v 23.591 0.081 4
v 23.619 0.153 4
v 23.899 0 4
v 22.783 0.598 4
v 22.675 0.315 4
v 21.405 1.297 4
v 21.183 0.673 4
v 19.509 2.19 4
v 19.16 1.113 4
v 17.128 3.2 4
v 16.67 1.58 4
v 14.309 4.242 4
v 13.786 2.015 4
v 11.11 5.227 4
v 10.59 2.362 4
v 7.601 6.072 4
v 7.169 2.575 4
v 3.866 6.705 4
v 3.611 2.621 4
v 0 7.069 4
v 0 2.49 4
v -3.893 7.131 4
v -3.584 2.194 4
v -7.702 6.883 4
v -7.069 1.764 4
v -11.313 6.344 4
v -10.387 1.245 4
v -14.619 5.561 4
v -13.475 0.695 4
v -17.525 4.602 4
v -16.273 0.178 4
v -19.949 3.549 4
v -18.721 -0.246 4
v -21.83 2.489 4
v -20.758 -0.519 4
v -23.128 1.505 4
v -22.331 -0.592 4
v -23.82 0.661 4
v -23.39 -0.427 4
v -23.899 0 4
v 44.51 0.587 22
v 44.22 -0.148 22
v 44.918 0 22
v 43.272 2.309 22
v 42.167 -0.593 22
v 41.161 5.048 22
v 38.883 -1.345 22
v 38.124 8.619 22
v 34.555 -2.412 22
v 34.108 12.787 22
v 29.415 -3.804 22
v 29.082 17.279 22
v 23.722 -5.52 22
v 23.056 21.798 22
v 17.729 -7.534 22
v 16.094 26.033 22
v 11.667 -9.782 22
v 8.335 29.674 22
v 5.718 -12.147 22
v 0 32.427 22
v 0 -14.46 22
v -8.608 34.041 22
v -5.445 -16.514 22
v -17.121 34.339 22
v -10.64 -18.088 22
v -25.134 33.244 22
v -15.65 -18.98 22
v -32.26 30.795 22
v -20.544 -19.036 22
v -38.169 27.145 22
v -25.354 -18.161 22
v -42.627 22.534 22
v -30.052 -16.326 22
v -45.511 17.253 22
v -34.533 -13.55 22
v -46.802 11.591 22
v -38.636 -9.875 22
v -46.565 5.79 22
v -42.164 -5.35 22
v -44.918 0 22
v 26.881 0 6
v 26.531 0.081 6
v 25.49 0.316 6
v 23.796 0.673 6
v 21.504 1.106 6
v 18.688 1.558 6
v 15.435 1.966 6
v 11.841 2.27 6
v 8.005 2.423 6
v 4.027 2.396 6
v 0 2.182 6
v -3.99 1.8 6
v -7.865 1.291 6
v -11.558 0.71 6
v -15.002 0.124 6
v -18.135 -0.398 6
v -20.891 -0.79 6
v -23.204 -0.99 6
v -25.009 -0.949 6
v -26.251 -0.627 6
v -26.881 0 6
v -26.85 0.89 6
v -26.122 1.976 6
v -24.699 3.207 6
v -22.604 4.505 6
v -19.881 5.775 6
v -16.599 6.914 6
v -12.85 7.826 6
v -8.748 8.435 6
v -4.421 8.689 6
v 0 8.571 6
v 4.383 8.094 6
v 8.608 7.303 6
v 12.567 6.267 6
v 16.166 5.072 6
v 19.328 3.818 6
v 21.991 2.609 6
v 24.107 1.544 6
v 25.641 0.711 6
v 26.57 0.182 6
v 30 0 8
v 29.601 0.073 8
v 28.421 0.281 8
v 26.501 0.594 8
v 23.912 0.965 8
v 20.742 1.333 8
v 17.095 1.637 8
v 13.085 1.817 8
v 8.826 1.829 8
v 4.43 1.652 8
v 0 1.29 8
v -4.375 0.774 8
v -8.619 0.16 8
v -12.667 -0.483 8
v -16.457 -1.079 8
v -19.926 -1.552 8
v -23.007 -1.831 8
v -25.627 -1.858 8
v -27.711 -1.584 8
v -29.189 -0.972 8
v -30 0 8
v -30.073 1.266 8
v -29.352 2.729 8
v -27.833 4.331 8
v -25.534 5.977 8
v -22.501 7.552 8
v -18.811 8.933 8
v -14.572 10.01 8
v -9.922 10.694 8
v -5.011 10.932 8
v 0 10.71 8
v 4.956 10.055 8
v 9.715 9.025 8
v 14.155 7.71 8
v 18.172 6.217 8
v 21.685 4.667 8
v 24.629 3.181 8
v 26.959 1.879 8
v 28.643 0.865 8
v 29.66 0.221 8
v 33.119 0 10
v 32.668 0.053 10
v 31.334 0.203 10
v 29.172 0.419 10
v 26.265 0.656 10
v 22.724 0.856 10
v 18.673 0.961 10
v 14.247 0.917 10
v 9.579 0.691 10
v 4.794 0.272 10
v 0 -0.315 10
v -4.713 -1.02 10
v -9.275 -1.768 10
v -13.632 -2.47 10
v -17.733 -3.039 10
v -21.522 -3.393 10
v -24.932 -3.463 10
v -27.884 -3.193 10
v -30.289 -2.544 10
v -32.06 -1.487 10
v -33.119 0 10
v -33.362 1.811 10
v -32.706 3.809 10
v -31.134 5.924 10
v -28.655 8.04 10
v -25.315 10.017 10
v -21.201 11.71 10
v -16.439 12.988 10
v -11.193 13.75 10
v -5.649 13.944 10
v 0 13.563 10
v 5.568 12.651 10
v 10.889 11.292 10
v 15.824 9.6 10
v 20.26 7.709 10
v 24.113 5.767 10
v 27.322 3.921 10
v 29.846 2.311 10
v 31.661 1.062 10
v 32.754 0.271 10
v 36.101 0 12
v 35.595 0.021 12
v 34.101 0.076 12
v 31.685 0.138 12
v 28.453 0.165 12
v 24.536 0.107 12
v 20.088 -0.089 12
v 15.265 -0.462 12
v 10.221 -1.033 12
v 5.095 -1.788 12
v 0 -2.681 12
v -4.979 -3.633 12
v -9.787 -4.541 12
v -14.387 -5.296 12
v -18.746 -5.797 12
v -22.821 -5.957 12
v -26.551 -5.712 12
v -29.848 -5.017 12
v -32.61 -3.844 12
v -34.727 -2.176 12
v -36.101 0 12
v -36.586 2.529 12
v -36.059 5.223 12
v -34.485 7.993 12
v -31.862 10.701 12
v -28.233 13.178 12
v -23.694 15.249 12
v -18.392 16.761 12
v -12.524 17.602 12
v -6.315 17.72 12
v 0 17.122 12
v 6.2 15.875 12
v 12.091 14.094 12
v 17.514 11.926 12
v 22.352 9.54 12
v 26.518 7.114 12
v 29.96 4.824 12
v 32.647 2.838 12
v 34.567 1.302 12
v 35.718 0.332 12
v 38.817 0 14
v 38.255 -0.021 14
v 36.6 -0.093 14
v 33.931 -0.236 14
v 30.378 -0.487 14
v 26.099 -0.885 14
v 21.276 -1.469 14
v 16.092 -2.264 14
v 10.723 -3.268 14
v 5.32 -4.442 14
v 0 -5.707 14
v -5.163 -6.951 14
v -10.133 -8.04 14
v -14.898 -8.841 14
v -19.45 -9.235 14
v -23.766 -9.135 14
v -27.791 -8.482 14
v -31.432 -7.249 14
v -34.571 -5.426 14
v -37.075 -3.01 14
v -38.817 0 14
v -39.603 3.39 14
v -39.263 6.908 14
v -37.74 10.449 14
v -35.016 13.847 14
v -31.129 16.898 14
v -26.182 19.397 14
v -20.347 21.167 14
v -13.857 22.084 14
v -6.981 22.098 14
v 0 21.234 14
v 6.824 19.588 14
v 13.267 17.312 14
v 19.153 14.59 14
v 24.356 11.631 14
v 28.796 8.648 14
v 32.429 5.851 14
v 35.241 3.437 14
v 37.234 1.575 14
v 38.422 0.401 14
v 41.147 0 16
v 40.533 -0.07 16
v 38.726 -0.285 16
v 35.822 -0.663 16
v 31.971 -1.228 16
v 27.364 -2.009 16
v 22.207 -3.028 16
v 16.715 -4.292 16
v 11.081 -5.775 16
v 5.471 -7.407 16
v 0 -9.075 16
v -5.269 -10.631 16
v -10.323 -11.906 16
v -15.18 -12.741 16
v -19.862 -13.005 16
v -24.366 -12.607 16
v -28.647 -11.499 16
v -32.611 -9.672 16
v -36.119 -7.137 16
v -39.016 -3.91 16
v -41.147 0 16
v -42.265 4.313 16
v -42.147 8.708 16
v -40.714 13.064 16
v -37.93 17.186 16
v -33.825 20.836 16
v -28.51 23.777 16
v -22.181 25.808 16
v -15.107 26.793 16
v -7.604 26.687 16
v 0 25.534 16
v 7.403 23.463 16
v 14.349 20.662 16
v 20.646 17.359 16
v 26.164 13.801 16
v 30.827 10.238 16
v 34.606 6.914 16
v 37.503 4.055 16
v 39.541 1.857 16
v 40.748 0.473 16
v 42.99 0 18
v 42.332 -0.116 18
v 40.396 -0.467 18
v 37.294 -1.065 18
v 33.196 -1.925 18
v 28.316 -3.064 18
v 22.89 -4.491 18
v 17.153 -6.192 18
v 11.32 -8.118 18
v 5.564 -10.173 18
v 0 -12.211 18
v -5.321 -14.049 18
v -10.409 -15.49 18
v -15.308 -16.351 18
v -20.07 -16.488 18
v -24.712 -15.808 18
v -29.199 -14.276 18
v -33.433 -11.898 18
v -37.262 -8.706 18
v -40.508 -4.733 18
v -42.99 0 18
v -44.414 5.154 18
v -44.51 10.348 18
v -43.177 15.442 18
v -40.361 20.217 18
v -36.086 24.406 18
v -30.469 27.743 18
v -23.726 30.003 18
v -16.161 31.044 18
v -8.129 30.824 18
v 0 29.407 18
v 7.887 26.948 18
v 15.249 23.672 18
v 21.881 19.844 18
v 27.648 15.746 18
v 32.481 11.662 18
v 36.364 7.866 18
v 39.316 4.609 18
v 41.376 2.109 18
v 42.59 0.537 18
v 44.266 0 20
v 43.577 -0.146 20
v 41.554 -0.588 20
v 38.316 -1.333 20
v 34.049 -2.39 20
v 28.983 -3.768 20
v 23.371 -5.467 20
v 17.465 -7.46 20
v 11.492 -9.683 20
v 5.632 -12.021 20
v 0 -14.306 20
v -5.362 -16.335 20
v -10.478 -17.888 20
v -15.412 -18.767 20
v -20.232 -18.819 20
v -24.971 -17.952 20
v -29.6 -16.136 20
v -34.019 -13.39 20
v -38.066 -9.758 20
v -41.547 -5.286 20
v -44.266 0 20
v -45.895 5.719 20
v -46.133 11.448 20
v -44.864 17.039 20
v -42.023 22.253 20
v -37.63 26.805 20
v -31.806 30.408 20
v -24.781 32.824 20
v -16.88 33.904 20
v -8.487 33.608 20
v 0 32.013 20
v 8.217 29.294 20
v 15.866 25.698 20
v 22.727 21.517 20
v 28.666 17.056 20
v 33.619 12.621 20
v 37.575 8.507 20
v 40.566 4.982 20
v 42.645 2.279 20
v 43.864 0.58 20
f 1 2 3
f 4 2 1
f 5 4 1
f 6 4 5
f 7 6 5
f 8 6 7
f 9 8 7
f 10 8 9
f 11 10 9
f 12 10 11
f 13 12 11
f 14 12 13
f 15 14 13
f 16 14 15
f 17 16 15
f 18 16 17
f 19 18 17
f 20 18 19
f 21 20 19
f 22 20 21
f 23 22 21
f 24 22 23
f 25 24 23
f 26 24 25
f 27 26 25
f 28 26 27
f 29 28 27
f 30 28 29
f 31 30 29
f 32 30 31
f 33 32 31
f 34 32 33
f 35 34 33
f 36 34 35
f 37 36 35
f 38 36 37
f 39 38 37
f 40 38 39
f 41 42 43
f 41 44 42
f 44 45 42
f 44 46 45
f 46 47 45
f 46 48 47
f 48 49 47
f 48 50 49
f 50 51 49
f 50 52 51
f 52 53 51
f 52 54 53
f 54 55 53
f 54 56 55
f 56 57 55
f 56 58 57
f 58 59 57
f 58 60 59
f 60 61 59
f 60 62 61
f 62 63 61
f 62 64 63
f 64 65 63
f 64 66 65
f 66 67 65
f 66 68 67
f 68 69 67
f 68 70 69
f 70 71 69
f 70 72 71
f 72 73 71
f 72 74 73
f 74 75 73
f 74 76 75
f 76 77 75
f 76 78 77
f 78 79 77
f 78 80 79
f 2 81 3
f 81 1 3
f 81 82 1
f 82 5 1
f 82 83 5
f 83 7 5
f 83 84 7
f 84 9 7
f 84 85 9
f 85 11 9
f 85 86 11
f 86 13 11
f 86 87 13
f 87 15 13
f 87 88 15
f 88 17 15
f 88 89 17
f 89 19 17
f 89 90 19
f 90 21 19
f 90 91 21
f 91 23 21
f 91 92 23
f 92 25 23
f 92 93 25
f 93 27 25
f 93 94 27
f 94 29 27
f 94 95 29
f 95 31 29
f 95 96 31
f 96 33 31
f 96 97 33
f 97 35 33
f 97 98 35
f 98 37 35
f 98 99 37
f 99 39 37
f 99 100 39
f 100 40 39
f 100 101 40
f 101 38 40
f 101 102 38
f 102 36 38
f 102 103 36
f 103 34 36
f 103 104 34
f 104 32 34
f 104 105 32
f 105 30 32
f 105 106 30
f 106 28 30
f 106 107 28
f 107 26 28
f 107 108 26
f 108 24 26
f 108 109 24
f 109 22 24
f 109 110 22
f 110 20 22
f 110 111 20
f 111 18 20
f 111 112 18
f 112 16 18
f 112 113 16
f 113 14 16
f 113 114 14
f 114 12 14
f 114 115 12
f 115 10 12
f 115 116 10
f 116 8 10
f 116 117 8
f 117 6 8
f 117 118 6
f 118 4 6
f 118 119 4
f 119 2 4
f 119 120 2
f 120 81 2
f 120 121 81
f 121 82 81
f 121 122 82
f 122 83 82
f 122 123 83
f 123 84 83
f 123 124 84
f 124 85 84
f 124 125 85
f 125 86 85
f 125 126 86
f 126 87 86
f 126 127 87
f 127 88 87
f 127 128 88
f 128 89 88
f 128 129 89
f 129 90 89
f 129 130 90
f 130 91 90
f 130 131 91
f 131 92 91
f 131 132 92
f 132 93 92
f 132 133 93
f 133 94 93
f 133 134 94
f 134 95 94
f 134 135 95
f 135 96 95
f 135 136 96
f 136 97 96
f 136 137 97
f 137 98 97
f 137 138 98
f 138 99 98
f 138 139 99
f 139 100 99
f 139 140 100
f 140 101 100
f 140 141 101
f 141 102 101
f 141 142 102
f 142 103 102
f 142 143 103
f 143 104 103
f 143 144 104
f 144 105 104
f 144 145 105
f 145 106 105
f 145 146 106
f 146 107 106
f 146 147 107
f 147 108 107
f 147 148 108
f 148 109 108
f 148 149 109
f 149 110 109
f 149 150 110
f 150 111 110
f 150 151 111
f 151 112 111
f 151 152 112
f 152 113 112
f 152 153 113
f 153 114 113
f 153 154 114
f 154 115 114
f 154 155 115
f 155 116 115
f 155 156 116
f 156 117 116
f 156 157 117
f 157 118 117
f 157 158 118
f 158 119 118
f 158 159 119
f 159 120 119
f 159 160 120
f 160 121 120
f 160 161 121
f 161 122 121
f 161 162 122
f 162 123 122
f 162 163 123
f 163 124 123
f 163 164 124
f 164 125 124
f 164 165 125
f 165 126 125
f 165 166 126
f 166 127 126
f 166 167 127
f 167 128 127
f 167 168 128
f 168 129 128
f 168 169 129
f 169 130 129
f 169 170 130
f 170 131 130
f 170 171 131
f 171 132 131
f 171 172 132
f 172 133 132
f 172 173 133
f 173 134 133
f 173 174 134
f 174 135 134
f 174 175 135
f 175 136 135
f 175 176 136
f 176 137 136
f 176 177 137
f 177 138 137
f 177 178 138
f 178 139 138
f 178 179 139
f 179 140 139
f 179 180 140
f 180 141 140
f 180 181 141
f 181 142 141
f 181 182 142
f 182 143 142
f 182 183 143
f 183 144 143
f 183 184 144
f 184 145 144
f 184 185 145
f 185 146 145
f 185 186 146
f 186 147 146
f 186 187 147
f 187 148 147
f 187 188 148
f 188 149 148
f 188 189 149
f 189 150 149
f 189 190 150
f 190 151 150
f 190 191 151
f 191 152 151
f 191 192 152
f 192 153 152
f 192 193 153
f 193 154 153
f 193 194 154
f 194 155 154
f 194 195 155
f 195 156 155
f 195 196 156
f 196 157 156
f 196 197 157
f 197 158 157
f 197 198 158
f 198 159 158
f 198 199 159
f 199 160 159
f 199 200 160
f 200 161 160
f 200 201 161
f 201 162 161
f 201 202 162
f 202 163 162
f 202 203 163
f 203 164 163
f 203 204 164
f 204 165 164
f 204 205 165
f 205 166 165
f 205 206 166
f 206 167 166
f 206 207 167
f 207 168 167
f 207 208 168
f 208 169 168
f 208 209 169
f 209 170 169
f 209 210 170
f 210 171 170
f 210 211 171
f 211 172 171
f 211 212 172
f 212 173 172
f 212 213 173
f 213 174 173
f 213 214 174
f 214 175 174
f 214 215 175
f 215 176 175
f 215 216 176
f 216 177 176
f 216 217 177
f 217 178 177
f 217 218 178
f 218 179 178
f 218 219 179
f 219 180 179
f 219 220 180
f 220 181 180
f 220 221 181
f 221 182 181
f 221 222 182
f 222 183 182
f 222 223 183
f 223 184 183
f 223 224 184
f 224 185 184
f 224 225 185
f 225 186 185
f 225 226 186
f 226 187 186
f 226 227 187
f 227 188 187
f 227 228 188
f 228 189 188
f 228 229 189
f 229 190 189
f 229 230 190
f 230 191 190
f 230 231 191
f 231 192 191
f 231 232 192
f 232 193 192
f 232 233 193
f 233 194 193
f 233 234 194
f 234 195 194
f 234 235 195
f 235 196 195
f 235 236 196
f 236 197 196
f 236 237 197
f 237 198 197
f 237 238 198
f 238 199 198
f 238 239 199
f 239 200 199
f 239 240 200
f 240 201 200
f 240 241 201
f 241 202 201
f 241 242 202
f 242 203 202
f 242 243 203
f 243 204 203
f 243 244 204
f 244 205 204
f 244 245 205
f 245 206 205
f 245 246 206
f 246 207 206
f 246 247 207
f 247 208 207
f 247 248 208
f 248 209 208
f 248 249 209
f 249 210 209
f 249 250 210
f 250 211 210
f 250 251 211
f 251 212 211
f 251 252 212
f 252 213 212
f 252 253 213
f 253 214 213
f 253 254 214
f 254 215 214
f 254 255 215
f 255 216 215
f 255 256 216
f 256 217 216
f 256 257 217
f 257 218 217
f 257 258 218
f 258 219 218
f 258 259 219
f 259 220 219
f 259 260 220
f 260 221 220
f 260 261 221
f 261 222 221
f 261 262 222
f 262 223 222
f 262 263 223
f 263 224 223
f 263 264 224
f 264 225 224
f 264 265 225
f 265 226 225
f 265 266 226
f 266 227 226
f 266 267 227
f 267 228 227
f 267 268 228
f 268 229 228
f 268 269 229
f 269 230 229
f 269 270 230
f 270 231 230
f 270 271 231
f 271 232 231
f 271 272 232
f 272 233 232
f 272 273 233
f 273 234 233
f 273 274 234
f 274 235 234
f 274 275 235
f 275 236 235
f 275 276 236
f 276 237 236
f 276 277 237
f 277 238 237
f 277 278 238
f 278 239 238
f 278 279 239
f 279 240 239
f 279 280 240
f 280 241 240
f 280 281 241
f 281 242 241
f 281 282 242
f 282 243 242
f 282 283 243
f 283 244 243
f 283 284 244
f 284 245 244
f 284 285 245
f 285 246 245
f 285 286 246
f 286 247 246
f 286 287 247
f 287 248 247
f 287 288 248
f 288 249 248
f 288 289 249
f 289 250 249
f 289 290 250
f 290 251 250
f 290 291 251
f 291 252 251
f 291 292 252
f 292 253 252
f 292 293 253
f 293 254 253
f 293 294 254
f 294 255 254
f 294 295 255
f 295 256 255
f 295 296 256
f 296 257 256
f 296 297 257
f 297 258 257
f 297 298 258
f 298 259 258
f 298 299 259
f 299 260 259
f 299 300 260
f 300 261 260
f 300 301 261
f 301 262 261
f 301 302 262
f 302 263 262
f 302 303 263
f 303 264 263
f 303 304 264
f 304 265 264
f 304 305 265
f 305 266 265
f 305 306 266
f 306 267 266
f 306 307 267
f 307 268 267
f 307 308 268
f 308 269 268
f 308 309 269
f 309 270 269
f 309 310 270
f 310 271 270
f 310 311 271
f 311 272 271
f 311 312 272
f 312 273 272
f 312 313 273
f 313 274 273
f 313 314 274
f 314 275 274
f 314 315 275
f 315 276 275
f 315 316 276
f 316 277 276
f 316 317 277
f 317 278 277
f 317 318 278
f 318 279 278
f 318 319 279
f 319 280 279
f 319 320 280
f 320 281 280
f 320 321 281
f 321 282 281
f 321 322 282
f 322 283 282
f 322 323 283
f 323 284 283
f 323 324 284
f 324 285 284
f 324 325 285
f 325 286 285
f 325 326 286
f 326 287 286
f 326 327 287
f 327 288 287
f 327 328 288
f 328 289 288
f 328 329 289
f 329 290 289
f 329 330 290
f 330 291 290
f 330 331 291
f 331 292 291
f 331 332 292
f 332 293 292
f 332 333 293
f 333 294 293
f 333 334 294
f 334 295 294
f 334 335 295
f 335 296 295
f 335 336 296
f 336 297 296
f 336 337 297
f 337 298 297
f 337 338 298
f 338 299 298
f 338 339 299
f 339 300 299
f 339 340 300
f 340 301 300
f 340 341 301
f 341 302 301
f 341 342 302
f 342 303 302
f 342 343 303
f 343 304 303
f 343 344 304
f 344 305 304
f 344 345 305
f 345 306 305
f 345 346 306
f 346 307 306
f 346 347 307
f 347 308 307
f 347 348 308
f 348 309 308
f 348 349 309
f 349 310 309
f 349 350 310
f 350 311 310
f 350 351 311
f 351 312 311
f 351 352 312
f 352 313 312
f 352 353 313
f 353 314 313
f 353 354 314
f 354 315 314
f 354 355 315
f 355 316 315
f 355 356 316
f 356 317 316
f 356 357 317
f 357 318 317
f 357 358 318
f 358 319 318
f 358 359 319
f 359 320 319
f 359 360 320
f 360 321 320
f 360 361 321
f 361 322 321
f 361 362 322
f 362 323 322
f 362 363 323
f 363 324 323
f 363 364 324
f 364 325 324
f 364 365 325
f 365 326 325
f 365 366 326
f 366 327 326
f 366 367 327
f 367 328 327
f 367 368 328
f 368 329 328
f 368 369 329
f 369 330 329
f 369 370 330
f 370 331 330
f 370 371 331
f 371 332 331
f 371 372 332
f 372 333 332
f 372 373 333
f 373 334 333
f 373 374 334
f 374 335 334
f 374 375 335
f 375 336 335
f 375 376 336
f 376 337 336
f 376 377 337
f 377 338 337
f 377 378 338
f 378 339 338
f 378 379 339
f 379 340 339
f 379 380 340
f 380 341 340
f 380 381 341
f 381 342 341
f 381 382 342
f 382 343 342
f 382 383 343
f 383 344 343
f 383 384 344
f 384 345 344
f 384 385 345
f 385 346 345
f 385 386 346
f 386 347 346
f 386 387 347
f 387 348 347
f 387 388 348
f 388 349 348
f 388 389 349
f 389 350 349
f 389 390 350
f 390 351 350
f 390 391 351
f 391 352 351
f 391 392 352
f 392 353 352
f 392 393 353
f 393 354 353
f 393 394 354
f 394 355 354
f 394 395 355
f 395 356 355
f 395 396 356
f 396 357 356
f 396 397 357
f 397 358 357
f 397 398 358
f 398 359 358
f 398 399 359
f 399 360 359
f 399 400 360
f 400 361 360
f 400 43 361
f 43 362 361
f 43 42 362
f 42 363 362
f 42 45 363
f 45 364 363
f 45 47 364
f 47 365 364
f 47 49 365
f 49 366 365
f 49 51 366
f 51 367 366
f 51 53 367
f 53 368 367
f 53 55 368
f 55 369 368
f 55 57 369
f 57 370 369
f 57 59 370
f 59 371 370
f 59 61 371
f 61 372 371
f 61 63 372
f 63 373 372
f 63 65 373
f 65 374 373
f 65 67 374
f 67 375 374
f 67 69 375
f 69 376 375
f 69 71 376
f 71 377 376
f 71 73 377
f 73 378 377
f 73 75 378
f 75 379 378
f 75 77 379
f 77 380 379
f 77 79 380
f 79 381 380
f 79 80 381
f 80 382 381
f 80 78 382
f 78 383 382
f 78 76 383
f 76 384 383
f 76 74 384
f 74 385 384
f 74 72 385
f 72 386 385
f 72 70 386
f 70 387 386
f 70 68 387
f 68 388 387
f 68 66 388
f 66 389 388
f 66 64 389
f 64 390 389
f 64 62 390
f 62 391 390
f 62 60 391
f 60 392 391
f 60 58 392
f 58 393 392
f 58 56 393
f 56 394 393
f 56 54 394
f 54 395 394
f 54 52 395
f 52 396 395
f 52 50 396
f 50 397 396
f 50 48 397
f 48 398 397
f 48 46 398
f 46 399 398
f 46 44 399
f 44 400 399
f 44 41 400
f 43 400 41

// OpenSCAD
// file: Naca4.scad
// Naca4.scad - library for parametric airfoils of 4 digit NACA series
// Code: Rudolf Huttary, Berlin 
// June 2015
// commercial use prohibited


// general use: for more examples refer to sampler.scad
// naca = naca digits or 3el vector  (default = 12 or [0, 0, .12])
// L    = chord length [mm]      (default= 100)
// N    = # sample points        (default= 81)
// h    = height [mm]            (default= 1)
// open = close at the thin end? (default = true)
// two equivalent example calls
 airfoil(naca = 2408, L = 60, N=1001, h = 30, open = false); 
// airfoil(naca = [.2, .4, .32], L = 60, N=1001, h = 30, open = false); 

module help()
{
  echo(str("\n\nList of signatures in lib:\n=================\n", 
  "module airfoil(naca=2412, L = 100, N = 81, h = 1, open = false) - renders airfoil object\n", 
  "module airfoil(naca=[.2, .4, .12], L = 100, N = 81, h = 1, open = false) - renders airfoil object using percentage for camber,  camber distance and thicknes\n", 
  "function airfoil_data(naca=12, L = 100, N = 81, open = false)\n",
  "=================\n")); 
}

help(); 
// this is the object
module airfoil(naca=12, L = 100, N = 81, h = 1, open = false)
{
  linear_extrude(height = h)
  polygon(points = airfoil_data(naca, L, N, open)); 
}

// this is the main function providing the airfoil data
function airfoil_data(naca=12, L = 100, N = 81, open = false) = 
  let(Na = len(naca)!=3?NACA(naca):naca)
  let(A = [.2969, -0.126, -.3516, .2843, open?-0.1015:-0.1036])
  [for (b=[-180:360/(N):179.99]) 
    let (x = (1-cos(b))/2)  
    let(yt = sign(b)*Na[2]/.2*(A*[sqrt(x), x, x*x, x*x*x, x*x*x*x])) 
    Na[0]==0?L*[x, yt]:L*camber(x, yt, Na[0], Na[1], sign(b))];  

// helper functions
function NACA(naca) =               // generates vector from NACA num
  let (M = floor(naca/1000))
  let (P = floor((naca-M*1000)/100)) 
  [M/100, P/10, floor(naca-M*1000-P*100)/100];  

function camber(x, y, M, P, upper) = 
  let(yc = (x<P)?M/P/P*(2*P*x-x*x): M/(1-P)/(1-P)*(1 - 2*P + 2*P*x -x*x))
  let(dy = (x<P)?2*M/P/P*(P-x):2*M/(1-P)/(1-P)*(P-x))
  let(th = atan(dy))
  [upper ? x - y*sin(th):x + y*sin(th), upper ? yc + y*cos(th):yc - y*cos(th)];
// main file
// Naca4_sweep.scad - sweep library
// Code: Rudolf Huttary, Berlin 
// 1st release : June 2015
// last update: 2017.02.10
// commercial use prohibited

use <Naca4.scad>

//example1(); 
//rotate([80, 180, 130])
example(); 

// sweep from NACA1480 to NACA6480 (len = 230 mm, winding y,z = 80°
// sweeps generates a single polyhedron from multiple datasets
module example()
{
  N = 40; 
  sweep(gen_dat(N=5, dz=1,N=N), showslices = false); 
//  sweep(gen_dat(N=5, dz=1,N=N), showslices = true); 
  
  // specific generator function
  function gen_dat(M=10,dz=.1,N=10) = [for (i=[1:dz:M])   
    let( L = length(i))
    let( af = vec3D(
        airfoil_data([.1,.5,thickness(i)], L=length(i), N = N)))
    T_(-L/2, 0, (i+1)*2, af)];  // translate airfoil
  
  function thickness(i) = .5*sin(i*i)+.1; 
  function length(i) = (60+sin(12*(i-3))*30); 
}

module help()
{
  echo(str("\n\nNaca4_sweep library by Rudolf Huttary\n",
  "List of signatures in lib:\n=================\n", 
  "sweep(dat, convexity = 5, showslices = false, close = false, planar_caps = false)  // dat - vec of vec2, with vec1 = airfoil_data\n", 
  "function vec3D(v, z=0)  // expand vec2 to vec3",
  "function rot(w=0, p) // rotate vec2",
  "function T_(x=0, y=0, z=0, v) // translates vec of vec3\n", 
  "function R_(x=0, y=0, z=0, v) // rotates vec of vec3\n", 
  "function Rx_(x=0, v) // x-rotates vec of vec3\n", 
  "function Ry_(y=0, v) // y-rotates vec of vec3\n", 
  "function Rz_(z=0, v) // z-rotates vec of vec3\n", 
  "function T_(x=0, y=0, z=0, v) // translates vec of vec3\n", 
  "function Tx_(x=0, v) // x-translates vec of vec3\n", 
  "function Ry_(y=0, v) // y-translates vec of vec3\n", 
  "function Rz_(z=0, v) // z-translates vec of vec3\n", 
  "function S_(x=0, y=0, z=0, v) // scales vec of vec3\n", 
  "function Sx_(x=0, v) // x-translates vec of vec3\n", 
  "function Sy_(x=0, v) // y-translates vec of vec3\n", 
  "function Sz_(x=0, v) // z-translates vec of vec3\n", 
  "=================\n")); 
}


// generate polyhedron from multiple airfoil_datasets
// dat - vec of vec1, with vec1 = simple polygon like airfoil_data, > 3 points per dataset expected
// use "planar_caps = false" only for non-planar cap faces with cord line symmetry
module sweep(dat, convexity = 5, showslices = false, close = false, planar_caps = false) 
{
  n = len(dat);     // # datasets
  l = len(dat[0]);  // points per dataset 
  if(l<=3) echo("ERROR: sweep() expects more than 3 points per dataset"); 
  if (showslices)  
    for(i=[0:n-1]) polyhedron(points = dat[i], faces = [count(l-1, 0)]);
  else
  {
    obj = sweep_(dat, close=close, planar_caps=planar_caps); 
    polyhedron(obj[0], obj[1], convexity = 5); 
  }
}
  function count(a, b) = [for (i=[a:(a<b?1:-1):b]) i]; 

function sweep_(dat, close = false, planar_caps = true) =   //returns [points, faces]; 
  let(n=len(dat), l=len(dat[0]))
  let(first = planar_caps?[count(l-1, 0)]: 
            faces_polygon(l, true))  // indices first face
  let(last = planar_caps?[count((n-1)*l,(n)*l-1)]: 
            faces_shift((n-2)*l, faces_polygon(l, false))) // indices last face
  let(faces = close?faces_sweep(l,n, close) :concat(first, last, faces_sweep(l,n))) 
  let(points = [for (i=[0:n-1], j=[0:l-1]) dat[i][j]]) // flatten points vector
    [points, faces]; 

function faces_shift(d, dat) = [for (i=[0:len(dat)-1]) dat[i] + [d, d, d]]; 

  
function del(A, n) = [for(i=[0:len(A)-1]) if (n!=i)A[i]]; 

//// knitting for polyhedron
  function faces_sweep(l, n=1, close = false) = 
      let(M = n*l, n1=close?n+1:n) 
      concat([[0,l,l-1]],   // first face
             [for (i=[0:l*(n1-1)-2], j = [0,1])
                j==0? [i, i+1, (i+l)%M] 
                    : [i+1, (i+l+1)%M, (i+l)%M]
             ]
             ,[[(n1*l-1)%M, (n1-1)*l-1, ((n1-1)*l)%M]
             ]); // last face
      ;
    
  function faces_polygon(l, first = true) = let(odd = (l%2==1), d=first?0:l)
    let(res = odd?concat([[d,d+1,d+l-1]],
      [for (i=[1:(l-3)/2], j=[0,1])(j==0)?[d+i,d+i+1,d+l-i]:[d+i+1,d+l-i-1, d+l-i]]):
      [for (i=[0:(l-4)/2], j=[0,1])(j==0)?[d+i,d+i+1,d+l-i-1]:[d+i+1,d+l-i-2, d+l-i-1]])
    first?facerev(res):res;
    
  function facerev(dat) = [for (i=[0:len(dat)-1]) [dat[i][0],dat[i][2],dat[i][1]]]; 



//// vector and vector set operation stuff ///////////////////////
//// Expand 2D vector into 3D
function vec3D(v, z=0) = [for(i = [0:len(v)-1]) 
  len(v[i])==2?[v[i][0], v[i][1], z]:v[i]+[0, 0, z]]; 

// Translation - 1D, 2D, 3D point vector //////////////////////////
// vector along all axes
function T_(x=0, y=0, z=0, v) = let(x_ = (len(x)==3)?x:[x, y, z])
  [for (i=[0:len(v)-1]) T__(x_[0], x_[1], x_[2], p=v[i])]; 
/// vector along one axis
function Tx_(x=0, v) = T_(x=x, v=v); 
function Ty_(y=0, v) = T_(y=y, v=v); 
function Tz_(z=0, v) = T_(z=z, v=v); 
/// point along all axes 1D, 2D, 3D allowed
function T__(x=0, y=0, z=0, p) = len(p)==3?p+[x, y, z]:len(p)==2?p+[x, y]:p+x; 

//// Rotation - 2D, 3D point vector ///////////////////////////////////
// vector around all axes 
function R_(x=0, y=0, z=0, v) =             // 2D vectors allowed 
  let(x_ = (len(x)==3)?x:[x, y, z])
  len(v[0])==3?Rz_(x_[2], Ry_(x_[1], Rx_(x_[0], v))):
  [for(i = [0:len(v)-1]) rot(x_[2], v[i])];  
// vector around one axis
function Rx_(w, A) = A*[[1, 0, 0], [0, cos(w), sin(w)], [0, -sin(w), cos(w)]]; 
function Ry_(w, A) = A*[[cos(w), 0, sin(w)], [0, 1, 0], [-sin(w), 0, cos(w)]]; 
function Rz_(w, A) = A*[[cos(w), sin(w), 0], [-sin(w), cos(w), 0], [0, 0, 1]]; 


//// Scale - 2D, 3D point vector ///////////////////////////////////
// vector along all axes 
function S_(x=1, y=1, z=1, v) = 
  [for (i=[0:len(v)-1]) S__(x,y,z, v[i])]; 
// vector along one axis
function Sx_(x=0, v) = S_(x=x, v=v); 
function Sy_(y=0, v) = S_(y=y, v=v); 
function Sz_(z=0, v) = S_(z=z, v=v); 
// single point in 2D
function S__(x=1, y=1, z=1, p) = 
  len(p)==3?[p[0]*x, p[1]*y, p[2]*z]:len(p)==2?[p[0]*x+p[1]*y]:[p[0]*x]; 

 
 
